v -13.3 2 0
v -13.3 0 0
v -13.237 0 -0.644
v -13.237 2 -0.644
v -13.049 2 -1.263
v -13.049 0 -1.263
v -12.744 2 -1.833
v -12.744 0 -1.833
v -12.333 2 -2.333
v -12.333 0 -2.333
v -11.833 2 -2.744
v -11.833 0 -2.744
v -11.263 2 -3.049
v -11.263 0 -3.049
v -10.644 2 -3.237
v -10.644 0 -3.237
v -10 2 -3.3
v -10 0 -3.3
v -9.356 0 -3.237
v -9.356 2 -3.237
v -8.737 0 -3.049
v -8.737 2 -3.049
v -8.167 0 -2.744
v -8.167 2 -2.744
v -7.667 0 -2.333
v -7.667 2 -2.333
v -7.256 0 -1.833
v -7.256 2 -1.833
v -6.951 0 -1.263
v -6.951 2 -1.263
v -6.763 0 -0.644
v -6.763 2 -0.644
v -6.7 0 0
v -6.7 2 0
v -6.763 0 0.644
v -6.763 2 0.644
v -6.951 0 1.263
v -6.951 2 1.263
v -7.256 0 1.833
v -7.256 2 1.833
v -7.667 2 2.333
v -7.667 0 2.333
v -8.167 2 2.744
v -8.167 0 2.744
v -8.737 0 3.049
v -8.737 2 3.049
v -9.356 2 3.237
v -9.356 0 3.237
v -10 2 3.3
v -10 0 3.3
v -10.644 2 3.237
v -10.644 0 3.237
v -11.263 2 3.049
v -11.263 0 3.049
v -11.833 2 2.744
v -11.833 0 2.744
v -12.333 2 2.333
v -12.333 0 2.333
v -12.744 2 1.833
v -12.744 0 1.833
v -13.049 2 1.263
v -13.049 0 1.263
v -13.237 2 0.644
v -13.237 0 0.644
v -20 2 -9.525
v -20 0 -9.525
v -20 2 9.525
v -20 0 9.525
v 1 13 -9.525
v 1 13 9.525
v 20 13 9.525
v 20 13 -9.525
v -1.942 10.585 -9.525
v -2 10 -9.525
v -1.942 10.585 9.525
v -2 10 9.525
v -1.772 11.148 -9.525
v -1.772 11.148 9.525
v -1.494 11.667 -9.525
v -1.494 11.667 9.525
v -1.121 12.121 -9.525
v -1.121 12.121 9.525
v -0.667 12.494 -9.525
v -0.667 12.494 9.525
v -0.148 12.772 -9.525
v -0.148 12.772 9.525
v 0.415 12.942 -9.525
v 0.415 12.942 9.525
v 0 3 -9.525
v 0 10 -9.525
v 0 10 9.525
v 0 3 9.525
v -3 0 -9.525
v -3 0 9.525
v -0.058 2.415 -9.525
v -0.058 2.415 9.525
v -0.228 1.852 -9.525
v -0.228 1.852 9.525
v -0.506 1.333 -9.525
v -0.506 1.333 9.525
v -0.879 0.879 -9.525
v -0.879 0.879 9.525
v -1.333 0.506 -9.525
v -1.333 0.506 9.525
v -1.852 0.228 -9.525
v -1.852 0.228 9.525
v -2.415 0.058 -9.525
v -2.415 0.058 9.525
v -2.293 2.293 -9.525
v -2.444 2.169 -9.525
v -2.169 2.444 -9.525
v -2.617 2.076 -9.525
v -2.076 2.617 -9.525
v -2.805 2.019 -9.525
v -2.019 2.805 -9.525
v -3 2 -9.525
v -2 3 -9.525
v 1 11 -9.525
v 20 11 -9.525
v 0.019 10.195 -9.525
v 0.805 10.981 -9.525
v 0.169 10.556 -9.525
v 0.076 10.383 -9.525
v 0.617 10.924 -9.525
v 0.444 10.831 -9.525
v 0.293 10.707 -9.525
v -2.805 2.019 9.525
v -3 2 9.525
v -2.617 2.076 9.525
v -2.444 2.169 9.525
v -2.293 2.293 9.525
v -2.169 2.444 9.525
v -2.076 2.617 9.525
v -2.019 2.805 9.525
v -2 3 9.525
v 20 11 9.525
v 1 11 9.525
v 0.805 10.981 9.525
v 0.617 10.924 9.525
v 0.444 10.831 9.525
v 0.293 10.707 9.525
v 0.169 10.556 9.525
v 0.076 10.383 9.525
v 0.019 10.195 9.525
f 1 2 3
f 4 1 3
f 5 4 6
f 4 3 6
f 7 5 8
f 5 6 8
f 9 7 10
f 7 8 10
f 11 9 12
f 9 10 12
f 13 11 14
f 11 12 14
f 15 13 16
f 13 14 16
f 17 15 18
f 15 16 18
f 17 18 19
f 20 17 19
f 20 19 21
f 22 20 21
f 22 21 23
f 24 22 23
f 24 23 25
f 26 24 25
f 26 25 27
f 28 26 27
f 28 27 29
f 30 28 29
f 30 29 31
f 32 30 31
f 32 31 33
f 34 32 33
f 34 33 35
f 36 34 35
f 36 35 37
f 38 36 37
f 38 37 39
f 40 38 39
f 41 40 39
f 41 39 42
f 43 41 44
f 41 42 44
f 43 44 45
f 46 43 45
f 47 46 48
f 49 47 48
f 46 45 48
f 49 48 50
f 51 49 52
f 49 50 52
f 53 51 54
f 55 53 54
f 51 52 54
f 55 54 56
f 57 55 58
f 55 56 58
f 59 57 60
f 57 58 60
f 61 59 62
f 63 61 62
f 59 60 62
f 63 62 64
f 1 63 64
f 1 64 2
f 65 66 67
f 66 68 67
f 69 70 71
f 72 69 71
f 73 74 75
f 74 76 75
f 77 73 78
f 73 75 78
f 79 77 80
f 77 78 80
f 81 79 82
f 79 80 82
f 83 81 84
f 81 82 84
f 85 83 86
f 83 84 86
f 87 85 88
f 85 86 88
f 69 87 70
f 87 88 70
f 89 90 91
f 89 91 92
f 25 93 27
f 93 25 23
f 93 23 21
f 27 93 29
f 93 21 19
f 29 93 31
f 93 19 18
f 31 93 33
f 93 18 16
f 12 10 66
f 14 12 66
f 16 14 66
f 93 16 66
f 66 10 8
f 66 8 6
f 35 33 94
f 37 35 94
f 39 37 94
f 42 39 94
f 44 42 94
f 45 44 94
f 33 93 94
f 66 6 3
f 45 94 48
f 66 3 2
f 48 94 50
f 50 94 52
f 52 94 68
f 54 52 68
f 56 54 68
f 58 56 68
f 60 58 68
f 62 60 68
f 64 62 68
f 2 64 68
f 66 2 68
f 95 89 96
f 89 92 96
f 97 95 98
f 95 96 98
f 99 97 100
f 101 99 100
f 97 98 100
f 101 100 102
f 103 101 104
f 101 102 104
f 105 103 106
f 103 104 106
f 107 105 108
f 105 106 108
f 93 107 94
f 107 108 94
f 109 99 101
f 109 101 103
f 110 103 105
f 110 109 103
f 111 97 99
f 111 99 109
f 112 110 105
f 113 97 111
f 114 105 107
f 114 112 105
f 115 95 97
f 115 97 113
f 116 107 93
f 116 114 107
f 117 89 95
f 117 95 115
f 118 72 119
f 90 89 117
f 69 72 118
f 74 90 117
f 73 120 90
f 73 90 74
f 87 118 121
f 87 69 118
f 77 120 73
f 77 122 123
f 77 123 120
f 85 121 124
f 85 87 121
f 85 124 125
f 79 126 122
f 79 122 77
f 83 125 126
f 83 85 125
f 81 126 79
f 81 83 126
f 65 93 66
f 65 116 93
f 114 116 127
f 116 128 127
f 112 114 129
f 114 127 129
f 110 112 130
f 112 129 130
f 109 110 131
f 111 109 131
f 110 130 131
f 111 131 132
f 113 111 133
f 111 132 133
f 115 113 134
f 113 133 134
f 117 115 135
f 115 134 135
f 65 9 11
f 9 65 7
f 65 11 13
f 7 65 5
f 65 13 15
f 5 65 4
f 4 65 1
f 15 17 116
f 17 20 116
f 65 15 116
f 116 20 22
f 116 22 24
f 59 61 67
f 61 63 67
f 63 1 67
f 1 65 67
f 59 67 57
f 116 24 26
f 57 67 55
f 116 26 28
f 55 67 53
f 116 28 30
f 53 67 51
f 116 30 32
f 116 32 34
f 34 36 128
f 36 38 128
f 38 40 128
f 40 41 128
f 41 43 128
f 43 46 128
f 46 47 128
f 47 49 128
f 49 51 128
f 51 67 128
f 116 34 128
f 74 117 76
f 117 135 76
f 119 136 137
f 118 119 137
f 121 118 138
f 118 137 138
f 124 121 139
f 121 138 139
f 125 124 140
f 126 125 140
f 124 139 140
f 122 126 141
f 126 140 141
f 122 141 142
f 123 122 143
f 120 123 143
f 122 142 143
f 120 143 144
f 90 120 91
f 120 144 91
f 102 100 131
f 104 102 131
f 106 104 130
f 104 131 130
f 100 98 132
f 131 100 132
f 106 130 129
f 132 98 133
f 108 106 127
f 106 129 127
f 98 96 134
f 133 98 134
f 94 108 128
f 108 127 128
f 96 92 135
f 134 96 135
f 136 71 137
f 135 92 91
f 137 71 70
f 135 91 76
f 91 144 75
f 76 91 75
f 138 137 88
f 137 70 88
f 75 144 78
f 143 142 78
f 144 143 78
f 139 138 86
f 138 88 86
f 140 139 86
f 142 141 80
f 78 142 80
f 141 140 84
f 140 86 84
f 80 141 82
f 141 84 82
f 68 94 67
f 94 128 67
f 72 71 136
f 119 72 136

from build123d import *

# Parameters (mm, degrees)
BRIDA_BASE1_DEPTH                = 9.525
TALADRO_DE_MARGEN_PARA_M65_D     = 6.6
TALADRO_DE_MARGEN_PARA_M65_DEPTH = 11.62
TALADRO_DE_MARGEN_PARA_M65_TIP   = 1.982840043


# Sheet-metal steps are written as plain solids
with BuildPart() as part:
    # Croquis1 → Brida base1 (new, symmetric)
    with BuildSketch(Plane.XY):
        with BuildLine():
            Line((20, 11), (1, 11))
            ThreePointArc((1, 11), (0.292893219, 10.707106781), (0, 10))
            Line((0, 10), (0, 3))
            ThreePointArc((0, 3), (-0.878679656, 0.878679656), (-3, 0))
            Line((-3, 0), (-20, 0))
            Line((-20, 0), (-20, 2))
            Line((-20, 2), (-3, 2))
            ThreePointArc((-3, 2), (-2.292893219, 2.292893219), (-2, 3))
            Line((-2, 3), (-2, 10))
            ThreePointArc((-2, 10), (-1.121320344, 12.121320344), (1, 13))
            Line((1, 13), (20, 13))
            Line((20, 13), (20, 11))
        make_face()
    extrude(amount=BRIDA_BASE1_DEPTH, both=True)

    # Taladro de margen para M65
    with Locations(Plane(origin=(-10, 2, 0), x_dir=(1, 0, 0), z_dir=(0, 1, 0))):
        with Locations((0, 0)):
            Hole(TALADRO_DE_MARGEN_PARA_M65_D / 2, depth=TALADRO_DE_MARGEN_PARA_M65_DEPTH)
            with Locations((0, 0, -(TALADRO_DE_MARGEN_PARA_M65_DEPTH + TALADRO_DE_MARGEN_PARA_M65_TIP / 2))):  # 118° drill point
                Cone(0, TALADRO_DE_MARGEN_PARA_M65_D / 2, TALADRO_DE_MARGEN_PARA_M65_TIP, mode=Mode.SUBTRACT)


solid = part.part
